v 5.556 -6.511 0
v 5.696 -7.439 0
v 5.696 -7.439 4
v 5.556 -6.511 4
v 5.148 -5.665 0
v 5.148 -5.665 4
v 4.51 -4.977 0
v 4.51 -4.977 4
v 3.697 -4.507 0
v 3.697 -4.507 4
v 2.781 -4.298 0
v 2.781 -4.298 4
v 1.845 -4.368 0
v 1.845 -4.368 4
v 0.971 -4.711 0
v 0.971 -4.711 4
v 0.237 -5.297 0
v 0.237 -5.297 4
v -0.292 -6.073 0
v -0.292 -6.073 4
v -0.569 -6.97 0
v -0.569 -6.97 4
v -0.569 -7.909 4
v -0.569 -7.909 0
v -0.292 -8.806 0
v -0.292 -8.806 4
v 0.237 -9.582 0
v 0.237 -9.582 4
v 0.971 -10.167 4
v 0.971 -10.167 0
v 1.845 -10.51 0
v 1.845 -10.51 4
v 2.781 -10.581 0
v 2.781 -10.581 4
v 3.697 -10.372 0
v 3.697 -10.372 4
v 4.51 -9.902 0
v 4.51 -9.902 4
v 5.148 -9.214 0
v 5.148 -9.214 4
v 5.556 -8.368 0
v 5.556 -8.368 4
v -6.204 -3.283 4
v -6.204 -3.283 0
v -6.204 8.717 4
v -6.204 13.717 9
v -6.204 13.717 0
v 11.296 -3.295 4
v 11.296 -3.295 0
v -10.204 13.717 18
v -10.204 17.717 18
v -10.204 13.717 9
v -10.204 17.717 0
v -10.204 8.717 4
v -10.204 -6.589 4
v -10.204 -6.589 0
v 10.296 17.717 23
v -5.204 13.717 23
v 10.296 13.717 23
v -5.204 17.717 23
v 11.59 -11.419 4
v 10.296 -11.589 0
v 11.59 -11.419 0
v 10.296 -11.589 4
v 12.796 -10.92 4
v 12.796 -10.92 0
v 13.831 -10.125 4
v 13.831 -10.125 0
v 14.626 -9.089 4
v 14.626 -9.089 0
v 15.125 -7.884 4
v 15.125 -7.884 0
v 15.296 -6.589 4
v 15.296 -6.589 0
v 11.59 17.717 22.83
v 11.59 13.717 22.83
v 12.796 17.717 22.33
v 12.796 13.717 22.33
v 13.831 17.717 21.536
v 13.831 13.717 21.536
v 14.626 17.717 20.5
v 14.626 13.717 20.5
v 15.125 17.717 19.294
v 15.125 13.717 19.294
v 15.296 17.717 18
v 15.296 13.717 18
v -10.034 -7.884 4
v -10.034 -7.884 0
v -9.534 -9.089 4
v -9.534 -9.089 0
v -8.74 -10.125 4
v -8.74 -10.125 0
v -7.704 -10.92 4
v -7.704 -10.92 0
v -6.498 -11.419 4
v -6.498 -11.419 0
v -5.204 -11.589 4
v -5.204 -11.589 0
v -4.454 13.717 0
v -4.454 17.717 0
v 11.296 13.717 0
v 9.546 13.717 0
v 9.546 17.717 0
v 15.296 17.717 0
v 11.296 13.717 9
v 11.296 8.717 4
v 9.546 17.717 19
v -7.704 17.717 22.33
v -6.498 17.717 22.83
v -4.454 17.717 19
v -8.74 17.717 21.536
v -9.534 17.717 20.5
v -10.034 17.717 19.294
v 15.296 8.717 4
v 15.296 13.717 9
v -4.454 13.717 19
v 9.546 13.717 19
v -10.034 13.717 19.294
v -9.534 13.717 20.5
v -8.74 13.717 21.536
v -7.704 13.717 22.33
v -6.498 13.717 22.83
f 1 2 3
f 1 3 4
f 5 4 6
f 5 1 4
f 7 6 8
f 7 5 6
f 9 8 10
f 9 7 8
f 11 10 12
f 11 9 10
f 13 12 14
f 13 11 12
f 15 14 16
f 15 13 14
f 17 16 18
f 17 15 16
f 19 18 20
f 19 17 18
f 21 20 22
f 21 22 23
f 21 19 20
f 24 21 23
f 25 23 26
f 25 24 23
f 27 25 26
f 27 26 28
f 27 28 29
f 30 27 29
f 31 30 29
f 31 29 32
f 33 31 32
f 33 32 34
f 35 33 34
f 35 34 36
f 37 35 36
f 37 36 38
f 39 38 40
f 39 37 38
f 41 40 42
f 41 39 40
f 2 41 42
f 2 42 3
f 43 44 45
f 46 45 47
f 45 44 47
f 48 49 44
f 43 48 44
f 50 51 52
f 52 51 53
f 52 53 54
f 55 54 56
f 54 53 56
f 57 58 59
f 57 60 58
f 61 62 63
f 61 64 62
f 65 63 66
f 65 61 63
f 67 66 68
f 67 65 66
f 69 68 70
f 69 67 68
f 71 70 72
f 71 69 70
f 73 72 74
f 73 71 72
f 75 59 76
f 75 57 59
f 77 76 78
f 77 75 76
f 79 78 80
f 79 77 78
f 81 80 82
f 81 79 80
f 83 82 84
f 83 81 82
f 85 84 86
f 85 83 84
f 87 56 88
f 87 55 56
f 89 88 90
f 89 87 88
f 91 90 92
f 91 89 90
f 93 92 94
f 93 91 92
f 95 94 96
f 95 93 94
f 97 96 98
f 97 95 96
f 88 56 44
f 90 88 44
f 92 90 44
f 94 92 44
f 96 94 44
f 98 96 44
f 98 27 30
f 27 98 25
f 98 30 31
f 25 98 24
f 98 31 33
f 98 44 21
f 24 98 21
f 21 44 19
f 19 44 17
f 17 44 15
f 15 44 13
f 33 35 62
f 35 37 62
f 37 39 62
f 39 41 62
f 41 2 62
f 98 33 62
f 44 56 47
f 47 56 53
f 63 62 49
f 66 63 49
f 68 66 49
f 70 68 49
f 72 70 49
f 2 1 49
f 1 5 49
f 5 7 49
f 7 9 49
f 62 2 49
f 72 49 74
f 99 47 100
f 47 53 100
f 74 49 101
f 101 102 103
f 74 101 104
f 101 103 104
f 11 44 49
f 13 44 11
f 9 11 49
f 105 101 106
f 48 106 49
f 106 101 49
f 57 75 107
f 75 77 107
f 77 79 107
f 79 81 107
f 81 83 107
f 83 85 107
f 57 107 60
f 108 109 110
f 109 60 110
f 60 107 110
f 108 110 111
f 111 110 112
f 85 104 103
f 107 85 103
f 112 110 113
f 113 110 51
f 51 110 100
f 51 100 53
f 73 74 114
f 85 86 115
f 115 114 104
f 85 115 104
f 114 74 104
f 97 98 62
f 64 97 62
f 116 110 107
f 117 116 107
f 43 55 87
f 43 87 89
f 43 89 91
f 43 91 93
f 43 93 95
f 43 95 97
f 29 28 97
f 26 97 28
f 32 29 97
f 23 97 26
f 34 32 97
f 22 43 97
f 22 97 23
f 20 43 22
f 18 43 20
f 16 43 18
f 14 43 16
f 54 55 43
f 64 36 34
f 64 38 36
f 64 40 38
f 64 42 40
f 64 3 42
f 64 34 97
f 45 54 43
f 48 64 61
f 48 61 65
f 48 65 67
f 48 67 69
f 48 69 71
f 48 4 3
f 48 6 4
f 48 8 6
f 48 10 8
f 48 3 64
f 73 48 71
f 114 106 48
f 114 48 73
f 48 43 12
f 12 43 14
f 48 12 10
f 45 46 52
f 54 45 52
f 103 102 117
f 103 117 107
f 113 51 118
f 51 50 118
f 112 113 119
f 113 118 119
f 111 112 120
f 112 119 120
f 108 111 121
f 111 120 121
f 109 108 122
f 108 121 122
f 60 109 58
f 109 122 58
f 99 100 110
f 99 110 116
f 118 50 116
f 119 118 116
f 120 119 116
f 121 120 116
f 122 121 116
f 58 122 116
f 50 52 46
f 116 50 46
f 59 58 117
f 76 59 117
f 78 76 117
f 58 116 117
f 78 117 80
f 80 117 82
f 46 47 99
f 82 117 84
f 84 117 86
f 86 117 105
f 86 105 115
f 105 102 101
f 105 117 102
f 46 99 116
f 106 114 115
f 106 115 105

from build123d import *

# Parameters (mm, degrees)
F1_R     = 3.15
F2_DEPTH = 4
F3_DEPTH = 23
F4_DEPTH = 19
F5_R     = 5
F6_SIZE  = 5


# Not quite as in the source:
# - a feature names something its author has since deleted; it is built from what else it names


with BuildPart() as f2:
    # F1 (on Top) → F2 (new body)
    with BuildSketch(Plane.XY):
        Polygon((-4.4541987248, 17.7165100388), (-10.2041987248, 17.7165100388), (-10.2041987248, 13.7165100388), (-6.2041987248, 13.7165100388), (-4.4541987248, 13.7165100388), align=None)
        Polygon((-6.2041987248, 13.7165100388), (-10.2041987248, 13.7165100388), (-10.2041987248, -11.5894424588), (15.2958012752, -11.5894424588), (15.2958012752, 13.7165100388), (11.2958012752, 13.7165100388), (11.2958012752, -3.2953930364), (-6.2041987248, -3.2834899612), align=None)
        with Locations((2.5458012752, -7.4394424588)):
            Circle(F1_R, mode=Mode.SUBTRACT)
        Polygon((9.5458012752, 17.7165100388), (-4.4541987248, 17.7165100388), (-4.4541987248, 13.7165100388), (-3.9542341456, 13.7165100388), (9.5458012752, 13.7165100388), align=None)
        Polygon((15.2958012752, 17.7165100388), (9.5458012752, 17.7165100388), (9.5458012752, 13.7165100388), (11.2958012752, 13.7165100388), (15.2958012752, 13.7165100388), align=None)
    extrude(amount=F2_DEPTH)

    # F1 (on Top) → F3 (join)
    with BuildSketch(Plane.XY):
        Polygon((-4.4541987248, 17.7165100388), (-10.2041987248, 17.7165100388), (-10.2041987248, 13.7165100388), (-6.2041987248, 13.7165100388), (-4.4541987248, 13.7165100388), align=None)
        Polygon((9.5458012752, 17.7165100388), (-4.4541987248, 17.7165100388), (-4.4541987248, 13.7165100388), (-3.9542341456, 13.7165100388), (9.5458012752, 13.7165100388), align=None)
        Polygon((15.2958012752, 17.7165100388), (9.5458012752, 17.7165100388), (9.5458012752, 13.7165100388), (11.2958012752, 13.7165100388), (15.2958012752, 13.7165100388), align=None)
    extrude(amount=F3_DEPTH)

    # F1 (on Top) → F4 (cut)
    with BuildSketch(Plane.XY):
        Polygon((9.5458012752, 17.7165100388), (-4.4541987248, 17.7165100388), (-4.4541987248, 13.7165100388), (-3.9542341456, 13.7165100388), (9.5458012752, 13.7165100388), align=None)
    extrude(amount=F4_DEPTH, mode=Mode.SUBTRACT)

    # F5
    f5_edges = [f2.edges().sort_by_distance(p)[0] for p in [
        (-10.204199, -11.589442, 2),
        (15.295801, -11.589442, 2),
        (15.295801, 15.71651, 23),
        (-10.204199, 15.71651, 23),
    ]]
    fillet(f5_edges, radius=F5_R)

    # F6
    f6_edges = [f2.edges().sort_by_distance(p)[0] for p in [
        (-8.204199, 13.71651, 4),
        (13.295801, 13.71651, 4),
    ]]
    chamfer(f6_edges, length=F6_SIZE)


solid = f2.part
